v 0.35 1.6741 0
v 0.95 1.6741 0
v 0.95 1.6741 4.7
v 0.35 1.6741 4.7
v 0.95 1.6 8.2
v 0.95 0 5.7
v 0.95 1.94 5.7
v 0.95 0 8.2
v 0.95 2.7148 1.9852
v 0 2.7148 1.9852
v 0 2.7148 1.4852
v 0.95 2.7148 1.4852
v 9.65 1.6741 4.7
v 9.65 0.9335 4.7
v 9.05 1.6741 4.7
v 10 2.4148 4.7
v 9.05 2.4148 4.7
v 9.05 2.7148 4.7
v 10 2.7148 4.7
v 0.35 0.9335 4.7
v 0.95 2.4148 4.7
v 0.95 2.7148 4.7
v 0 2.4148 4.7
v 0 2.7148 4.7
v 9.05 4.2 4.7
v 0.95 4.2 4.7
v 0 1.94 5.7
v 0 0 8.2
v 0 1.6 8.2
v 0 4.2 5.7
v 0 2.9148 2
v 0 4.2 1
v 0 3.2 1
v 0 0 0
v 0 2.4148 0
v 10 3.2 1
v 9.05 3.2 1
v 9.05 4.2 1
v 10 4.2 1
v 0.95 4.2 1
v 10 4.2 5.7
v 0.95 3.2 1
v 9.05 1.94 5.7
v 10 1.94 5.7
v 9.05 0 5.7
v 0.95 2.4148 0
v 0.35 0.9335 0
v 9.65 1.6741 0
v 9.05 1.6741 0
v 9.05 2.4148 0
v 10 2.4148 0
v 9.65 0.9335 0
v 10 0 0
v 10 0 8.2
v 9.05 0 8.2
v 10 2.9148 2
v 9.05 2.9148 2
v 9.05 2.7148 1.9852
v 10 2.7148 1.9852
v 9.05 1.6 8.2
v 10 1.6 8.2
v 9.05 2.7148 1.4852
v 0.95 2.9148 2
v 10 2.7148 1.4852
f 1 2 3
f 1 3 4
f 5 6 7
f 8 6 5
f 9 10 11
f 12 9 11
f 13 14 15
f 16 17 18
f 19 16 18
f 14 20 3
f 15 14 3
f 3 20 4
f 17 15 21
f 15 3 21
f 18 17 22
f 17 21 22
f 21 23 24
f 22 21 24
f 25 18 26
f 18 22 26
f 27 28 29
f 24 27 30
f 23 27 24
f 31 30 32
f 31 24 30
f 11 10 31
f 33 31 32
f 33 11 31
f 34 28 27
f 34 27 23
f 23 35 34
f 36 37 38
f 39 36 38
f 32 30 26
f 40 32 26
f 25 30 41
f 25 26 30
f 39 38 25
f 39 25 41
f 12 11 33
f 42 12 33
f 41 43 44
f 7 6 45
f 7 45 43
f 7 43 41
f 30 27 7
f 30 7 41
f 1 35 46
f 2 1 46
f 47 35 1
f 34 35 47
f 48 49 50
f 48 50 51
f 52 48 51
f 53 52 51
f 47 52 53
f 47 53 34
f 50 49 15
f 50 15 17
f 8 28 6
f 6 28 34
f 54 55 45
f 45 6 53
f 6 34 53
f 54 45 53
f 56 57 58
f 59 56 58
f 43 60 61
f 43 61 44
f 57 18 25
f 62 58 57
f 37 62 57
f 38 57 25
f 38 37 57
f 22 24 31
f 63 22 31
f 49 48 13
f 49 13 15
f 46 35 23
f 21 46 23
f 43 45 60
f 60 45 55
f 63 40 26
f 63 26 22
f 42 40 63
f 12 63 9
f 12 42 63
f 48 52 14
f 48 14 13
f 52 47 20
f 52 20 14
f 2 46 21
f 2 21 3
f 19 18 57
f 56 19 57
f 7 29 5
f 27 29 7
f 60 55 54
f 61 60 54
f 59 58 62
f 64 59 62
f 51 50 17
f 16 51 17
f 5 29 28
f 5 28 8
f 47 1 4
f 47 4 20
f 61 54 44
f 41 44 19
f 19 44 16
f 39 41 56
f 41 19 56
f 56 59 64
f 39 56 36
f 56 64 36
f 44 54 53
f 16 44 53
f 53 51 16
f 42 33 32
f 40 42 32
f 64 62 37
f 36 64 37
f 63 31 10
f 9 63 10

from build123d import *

# Parameters (mm, degrees)
SKETCH1_W           = 10
SKETCH1_H           = 8.2
BOSS_EXTRUDE1_DEPTH = 4.2
CUT_EXTRUDE1_DEPTH  = 10
CUT_EXTRUDE2_DEPTH  = 10
CUT_EXTRUDE4_DEPTH  = 4.7
CUT_EXTRUDE5_REACH  = 6.2
SKETCH6_W           = 8.1
SKETCH6_H           = 2.5


with BuildPart() as part:
    # Sketch1 → Boss-Extrude1 (new body)
    with BuildSketch(Plane(origin=(0, 0, 0), x_dir=(1, 0, 0), z_dir=(0, 1, 0))):
        with Locations((5, -4.1)):
            Rectangle(SKETCH1_W, SKETCH1_H)
    extrude(amount=BOSS_EXTRUDE1_DEPTH)

    # Sketch2 → Cut-Extrude1 (cut)
    with BuildSketch(Plane.ZY):
        Polygon((8.2, 4.2), (8.2, 1.6), (5.7, 1.94), (5.7, 4.2), align=None)
    extrude(amount=-CUT_EXTRUDE1_DEPTH, mode=Mode.SUBTRACT)

    # Sketch3 → Cut-Extrude2 (cut)
    with BuildSketch(Plane.ZY):
        Polygon((0, 2.414814815), (4.7, 2.414814815), (4.7, 2.714814815), (2, 2.914814815), (1.985185185, 2.714814815), (1.485185185, 2.714814815), (1, 3.2), (1, 4.2), (0, 4.2), align=None)
    extrude(amount=-CUT_EXTRUDE2_DEPTH, mode=Mode.SUBTRACT)

    # Sketch4 → Cut-Extrude4 (cut)
    with BuildSketch(Plane(origin=(0, 0, 0), x_dir=(-1, 0, 0), z_dir=(0, 0, -1))):
        Polygon((-9.65, 0.93347747), (-9.65, 1.674146142), (-9.05, 1.674146142), (-9.05, 4.2), (-0.95, 4.2), (-0.95, 1.674146142), (-0.35, 1.674146142), (-0.35, 0.93347747), align=None)
    extrude(amount=-CUT_EXTRUDE4_DEPTH, mode=Mode.SUBTRACT)

    # Cut-Extrude5: up to this face of the body (flat: up to its plane)
    cut_extrude5_end = Plane(part.part.faces().sort_by_distance((5, 1.77, 6.95))[0])
    # Sketch6 → Cut-Extrude5 (cut, up to the picked face)
    with BuildSketch(Plane.XZ, mode=Mode.PRIVATE) as cut_extrude5_sk1:
        with Locations((5, 6.95)):
            Rectangle(SKETCH6_W, SKETCH6_H)
    cut_extrude5_tool1 = split(extrude(cut_extrude5_sk1.sketch, amount=-CUT_EXTRUDE5_REACH, mode=Mode.PRIVATE), bisect_by=cut_extrude5_end, keep=Keep.BOTH, mode=Mode.PRIVATE)
    add(cut_extrude5_tool1.solids().sort_by_distance((5, 0, 6.95))[0], mode=Mode.SUBTRACT)


solid = part.part
